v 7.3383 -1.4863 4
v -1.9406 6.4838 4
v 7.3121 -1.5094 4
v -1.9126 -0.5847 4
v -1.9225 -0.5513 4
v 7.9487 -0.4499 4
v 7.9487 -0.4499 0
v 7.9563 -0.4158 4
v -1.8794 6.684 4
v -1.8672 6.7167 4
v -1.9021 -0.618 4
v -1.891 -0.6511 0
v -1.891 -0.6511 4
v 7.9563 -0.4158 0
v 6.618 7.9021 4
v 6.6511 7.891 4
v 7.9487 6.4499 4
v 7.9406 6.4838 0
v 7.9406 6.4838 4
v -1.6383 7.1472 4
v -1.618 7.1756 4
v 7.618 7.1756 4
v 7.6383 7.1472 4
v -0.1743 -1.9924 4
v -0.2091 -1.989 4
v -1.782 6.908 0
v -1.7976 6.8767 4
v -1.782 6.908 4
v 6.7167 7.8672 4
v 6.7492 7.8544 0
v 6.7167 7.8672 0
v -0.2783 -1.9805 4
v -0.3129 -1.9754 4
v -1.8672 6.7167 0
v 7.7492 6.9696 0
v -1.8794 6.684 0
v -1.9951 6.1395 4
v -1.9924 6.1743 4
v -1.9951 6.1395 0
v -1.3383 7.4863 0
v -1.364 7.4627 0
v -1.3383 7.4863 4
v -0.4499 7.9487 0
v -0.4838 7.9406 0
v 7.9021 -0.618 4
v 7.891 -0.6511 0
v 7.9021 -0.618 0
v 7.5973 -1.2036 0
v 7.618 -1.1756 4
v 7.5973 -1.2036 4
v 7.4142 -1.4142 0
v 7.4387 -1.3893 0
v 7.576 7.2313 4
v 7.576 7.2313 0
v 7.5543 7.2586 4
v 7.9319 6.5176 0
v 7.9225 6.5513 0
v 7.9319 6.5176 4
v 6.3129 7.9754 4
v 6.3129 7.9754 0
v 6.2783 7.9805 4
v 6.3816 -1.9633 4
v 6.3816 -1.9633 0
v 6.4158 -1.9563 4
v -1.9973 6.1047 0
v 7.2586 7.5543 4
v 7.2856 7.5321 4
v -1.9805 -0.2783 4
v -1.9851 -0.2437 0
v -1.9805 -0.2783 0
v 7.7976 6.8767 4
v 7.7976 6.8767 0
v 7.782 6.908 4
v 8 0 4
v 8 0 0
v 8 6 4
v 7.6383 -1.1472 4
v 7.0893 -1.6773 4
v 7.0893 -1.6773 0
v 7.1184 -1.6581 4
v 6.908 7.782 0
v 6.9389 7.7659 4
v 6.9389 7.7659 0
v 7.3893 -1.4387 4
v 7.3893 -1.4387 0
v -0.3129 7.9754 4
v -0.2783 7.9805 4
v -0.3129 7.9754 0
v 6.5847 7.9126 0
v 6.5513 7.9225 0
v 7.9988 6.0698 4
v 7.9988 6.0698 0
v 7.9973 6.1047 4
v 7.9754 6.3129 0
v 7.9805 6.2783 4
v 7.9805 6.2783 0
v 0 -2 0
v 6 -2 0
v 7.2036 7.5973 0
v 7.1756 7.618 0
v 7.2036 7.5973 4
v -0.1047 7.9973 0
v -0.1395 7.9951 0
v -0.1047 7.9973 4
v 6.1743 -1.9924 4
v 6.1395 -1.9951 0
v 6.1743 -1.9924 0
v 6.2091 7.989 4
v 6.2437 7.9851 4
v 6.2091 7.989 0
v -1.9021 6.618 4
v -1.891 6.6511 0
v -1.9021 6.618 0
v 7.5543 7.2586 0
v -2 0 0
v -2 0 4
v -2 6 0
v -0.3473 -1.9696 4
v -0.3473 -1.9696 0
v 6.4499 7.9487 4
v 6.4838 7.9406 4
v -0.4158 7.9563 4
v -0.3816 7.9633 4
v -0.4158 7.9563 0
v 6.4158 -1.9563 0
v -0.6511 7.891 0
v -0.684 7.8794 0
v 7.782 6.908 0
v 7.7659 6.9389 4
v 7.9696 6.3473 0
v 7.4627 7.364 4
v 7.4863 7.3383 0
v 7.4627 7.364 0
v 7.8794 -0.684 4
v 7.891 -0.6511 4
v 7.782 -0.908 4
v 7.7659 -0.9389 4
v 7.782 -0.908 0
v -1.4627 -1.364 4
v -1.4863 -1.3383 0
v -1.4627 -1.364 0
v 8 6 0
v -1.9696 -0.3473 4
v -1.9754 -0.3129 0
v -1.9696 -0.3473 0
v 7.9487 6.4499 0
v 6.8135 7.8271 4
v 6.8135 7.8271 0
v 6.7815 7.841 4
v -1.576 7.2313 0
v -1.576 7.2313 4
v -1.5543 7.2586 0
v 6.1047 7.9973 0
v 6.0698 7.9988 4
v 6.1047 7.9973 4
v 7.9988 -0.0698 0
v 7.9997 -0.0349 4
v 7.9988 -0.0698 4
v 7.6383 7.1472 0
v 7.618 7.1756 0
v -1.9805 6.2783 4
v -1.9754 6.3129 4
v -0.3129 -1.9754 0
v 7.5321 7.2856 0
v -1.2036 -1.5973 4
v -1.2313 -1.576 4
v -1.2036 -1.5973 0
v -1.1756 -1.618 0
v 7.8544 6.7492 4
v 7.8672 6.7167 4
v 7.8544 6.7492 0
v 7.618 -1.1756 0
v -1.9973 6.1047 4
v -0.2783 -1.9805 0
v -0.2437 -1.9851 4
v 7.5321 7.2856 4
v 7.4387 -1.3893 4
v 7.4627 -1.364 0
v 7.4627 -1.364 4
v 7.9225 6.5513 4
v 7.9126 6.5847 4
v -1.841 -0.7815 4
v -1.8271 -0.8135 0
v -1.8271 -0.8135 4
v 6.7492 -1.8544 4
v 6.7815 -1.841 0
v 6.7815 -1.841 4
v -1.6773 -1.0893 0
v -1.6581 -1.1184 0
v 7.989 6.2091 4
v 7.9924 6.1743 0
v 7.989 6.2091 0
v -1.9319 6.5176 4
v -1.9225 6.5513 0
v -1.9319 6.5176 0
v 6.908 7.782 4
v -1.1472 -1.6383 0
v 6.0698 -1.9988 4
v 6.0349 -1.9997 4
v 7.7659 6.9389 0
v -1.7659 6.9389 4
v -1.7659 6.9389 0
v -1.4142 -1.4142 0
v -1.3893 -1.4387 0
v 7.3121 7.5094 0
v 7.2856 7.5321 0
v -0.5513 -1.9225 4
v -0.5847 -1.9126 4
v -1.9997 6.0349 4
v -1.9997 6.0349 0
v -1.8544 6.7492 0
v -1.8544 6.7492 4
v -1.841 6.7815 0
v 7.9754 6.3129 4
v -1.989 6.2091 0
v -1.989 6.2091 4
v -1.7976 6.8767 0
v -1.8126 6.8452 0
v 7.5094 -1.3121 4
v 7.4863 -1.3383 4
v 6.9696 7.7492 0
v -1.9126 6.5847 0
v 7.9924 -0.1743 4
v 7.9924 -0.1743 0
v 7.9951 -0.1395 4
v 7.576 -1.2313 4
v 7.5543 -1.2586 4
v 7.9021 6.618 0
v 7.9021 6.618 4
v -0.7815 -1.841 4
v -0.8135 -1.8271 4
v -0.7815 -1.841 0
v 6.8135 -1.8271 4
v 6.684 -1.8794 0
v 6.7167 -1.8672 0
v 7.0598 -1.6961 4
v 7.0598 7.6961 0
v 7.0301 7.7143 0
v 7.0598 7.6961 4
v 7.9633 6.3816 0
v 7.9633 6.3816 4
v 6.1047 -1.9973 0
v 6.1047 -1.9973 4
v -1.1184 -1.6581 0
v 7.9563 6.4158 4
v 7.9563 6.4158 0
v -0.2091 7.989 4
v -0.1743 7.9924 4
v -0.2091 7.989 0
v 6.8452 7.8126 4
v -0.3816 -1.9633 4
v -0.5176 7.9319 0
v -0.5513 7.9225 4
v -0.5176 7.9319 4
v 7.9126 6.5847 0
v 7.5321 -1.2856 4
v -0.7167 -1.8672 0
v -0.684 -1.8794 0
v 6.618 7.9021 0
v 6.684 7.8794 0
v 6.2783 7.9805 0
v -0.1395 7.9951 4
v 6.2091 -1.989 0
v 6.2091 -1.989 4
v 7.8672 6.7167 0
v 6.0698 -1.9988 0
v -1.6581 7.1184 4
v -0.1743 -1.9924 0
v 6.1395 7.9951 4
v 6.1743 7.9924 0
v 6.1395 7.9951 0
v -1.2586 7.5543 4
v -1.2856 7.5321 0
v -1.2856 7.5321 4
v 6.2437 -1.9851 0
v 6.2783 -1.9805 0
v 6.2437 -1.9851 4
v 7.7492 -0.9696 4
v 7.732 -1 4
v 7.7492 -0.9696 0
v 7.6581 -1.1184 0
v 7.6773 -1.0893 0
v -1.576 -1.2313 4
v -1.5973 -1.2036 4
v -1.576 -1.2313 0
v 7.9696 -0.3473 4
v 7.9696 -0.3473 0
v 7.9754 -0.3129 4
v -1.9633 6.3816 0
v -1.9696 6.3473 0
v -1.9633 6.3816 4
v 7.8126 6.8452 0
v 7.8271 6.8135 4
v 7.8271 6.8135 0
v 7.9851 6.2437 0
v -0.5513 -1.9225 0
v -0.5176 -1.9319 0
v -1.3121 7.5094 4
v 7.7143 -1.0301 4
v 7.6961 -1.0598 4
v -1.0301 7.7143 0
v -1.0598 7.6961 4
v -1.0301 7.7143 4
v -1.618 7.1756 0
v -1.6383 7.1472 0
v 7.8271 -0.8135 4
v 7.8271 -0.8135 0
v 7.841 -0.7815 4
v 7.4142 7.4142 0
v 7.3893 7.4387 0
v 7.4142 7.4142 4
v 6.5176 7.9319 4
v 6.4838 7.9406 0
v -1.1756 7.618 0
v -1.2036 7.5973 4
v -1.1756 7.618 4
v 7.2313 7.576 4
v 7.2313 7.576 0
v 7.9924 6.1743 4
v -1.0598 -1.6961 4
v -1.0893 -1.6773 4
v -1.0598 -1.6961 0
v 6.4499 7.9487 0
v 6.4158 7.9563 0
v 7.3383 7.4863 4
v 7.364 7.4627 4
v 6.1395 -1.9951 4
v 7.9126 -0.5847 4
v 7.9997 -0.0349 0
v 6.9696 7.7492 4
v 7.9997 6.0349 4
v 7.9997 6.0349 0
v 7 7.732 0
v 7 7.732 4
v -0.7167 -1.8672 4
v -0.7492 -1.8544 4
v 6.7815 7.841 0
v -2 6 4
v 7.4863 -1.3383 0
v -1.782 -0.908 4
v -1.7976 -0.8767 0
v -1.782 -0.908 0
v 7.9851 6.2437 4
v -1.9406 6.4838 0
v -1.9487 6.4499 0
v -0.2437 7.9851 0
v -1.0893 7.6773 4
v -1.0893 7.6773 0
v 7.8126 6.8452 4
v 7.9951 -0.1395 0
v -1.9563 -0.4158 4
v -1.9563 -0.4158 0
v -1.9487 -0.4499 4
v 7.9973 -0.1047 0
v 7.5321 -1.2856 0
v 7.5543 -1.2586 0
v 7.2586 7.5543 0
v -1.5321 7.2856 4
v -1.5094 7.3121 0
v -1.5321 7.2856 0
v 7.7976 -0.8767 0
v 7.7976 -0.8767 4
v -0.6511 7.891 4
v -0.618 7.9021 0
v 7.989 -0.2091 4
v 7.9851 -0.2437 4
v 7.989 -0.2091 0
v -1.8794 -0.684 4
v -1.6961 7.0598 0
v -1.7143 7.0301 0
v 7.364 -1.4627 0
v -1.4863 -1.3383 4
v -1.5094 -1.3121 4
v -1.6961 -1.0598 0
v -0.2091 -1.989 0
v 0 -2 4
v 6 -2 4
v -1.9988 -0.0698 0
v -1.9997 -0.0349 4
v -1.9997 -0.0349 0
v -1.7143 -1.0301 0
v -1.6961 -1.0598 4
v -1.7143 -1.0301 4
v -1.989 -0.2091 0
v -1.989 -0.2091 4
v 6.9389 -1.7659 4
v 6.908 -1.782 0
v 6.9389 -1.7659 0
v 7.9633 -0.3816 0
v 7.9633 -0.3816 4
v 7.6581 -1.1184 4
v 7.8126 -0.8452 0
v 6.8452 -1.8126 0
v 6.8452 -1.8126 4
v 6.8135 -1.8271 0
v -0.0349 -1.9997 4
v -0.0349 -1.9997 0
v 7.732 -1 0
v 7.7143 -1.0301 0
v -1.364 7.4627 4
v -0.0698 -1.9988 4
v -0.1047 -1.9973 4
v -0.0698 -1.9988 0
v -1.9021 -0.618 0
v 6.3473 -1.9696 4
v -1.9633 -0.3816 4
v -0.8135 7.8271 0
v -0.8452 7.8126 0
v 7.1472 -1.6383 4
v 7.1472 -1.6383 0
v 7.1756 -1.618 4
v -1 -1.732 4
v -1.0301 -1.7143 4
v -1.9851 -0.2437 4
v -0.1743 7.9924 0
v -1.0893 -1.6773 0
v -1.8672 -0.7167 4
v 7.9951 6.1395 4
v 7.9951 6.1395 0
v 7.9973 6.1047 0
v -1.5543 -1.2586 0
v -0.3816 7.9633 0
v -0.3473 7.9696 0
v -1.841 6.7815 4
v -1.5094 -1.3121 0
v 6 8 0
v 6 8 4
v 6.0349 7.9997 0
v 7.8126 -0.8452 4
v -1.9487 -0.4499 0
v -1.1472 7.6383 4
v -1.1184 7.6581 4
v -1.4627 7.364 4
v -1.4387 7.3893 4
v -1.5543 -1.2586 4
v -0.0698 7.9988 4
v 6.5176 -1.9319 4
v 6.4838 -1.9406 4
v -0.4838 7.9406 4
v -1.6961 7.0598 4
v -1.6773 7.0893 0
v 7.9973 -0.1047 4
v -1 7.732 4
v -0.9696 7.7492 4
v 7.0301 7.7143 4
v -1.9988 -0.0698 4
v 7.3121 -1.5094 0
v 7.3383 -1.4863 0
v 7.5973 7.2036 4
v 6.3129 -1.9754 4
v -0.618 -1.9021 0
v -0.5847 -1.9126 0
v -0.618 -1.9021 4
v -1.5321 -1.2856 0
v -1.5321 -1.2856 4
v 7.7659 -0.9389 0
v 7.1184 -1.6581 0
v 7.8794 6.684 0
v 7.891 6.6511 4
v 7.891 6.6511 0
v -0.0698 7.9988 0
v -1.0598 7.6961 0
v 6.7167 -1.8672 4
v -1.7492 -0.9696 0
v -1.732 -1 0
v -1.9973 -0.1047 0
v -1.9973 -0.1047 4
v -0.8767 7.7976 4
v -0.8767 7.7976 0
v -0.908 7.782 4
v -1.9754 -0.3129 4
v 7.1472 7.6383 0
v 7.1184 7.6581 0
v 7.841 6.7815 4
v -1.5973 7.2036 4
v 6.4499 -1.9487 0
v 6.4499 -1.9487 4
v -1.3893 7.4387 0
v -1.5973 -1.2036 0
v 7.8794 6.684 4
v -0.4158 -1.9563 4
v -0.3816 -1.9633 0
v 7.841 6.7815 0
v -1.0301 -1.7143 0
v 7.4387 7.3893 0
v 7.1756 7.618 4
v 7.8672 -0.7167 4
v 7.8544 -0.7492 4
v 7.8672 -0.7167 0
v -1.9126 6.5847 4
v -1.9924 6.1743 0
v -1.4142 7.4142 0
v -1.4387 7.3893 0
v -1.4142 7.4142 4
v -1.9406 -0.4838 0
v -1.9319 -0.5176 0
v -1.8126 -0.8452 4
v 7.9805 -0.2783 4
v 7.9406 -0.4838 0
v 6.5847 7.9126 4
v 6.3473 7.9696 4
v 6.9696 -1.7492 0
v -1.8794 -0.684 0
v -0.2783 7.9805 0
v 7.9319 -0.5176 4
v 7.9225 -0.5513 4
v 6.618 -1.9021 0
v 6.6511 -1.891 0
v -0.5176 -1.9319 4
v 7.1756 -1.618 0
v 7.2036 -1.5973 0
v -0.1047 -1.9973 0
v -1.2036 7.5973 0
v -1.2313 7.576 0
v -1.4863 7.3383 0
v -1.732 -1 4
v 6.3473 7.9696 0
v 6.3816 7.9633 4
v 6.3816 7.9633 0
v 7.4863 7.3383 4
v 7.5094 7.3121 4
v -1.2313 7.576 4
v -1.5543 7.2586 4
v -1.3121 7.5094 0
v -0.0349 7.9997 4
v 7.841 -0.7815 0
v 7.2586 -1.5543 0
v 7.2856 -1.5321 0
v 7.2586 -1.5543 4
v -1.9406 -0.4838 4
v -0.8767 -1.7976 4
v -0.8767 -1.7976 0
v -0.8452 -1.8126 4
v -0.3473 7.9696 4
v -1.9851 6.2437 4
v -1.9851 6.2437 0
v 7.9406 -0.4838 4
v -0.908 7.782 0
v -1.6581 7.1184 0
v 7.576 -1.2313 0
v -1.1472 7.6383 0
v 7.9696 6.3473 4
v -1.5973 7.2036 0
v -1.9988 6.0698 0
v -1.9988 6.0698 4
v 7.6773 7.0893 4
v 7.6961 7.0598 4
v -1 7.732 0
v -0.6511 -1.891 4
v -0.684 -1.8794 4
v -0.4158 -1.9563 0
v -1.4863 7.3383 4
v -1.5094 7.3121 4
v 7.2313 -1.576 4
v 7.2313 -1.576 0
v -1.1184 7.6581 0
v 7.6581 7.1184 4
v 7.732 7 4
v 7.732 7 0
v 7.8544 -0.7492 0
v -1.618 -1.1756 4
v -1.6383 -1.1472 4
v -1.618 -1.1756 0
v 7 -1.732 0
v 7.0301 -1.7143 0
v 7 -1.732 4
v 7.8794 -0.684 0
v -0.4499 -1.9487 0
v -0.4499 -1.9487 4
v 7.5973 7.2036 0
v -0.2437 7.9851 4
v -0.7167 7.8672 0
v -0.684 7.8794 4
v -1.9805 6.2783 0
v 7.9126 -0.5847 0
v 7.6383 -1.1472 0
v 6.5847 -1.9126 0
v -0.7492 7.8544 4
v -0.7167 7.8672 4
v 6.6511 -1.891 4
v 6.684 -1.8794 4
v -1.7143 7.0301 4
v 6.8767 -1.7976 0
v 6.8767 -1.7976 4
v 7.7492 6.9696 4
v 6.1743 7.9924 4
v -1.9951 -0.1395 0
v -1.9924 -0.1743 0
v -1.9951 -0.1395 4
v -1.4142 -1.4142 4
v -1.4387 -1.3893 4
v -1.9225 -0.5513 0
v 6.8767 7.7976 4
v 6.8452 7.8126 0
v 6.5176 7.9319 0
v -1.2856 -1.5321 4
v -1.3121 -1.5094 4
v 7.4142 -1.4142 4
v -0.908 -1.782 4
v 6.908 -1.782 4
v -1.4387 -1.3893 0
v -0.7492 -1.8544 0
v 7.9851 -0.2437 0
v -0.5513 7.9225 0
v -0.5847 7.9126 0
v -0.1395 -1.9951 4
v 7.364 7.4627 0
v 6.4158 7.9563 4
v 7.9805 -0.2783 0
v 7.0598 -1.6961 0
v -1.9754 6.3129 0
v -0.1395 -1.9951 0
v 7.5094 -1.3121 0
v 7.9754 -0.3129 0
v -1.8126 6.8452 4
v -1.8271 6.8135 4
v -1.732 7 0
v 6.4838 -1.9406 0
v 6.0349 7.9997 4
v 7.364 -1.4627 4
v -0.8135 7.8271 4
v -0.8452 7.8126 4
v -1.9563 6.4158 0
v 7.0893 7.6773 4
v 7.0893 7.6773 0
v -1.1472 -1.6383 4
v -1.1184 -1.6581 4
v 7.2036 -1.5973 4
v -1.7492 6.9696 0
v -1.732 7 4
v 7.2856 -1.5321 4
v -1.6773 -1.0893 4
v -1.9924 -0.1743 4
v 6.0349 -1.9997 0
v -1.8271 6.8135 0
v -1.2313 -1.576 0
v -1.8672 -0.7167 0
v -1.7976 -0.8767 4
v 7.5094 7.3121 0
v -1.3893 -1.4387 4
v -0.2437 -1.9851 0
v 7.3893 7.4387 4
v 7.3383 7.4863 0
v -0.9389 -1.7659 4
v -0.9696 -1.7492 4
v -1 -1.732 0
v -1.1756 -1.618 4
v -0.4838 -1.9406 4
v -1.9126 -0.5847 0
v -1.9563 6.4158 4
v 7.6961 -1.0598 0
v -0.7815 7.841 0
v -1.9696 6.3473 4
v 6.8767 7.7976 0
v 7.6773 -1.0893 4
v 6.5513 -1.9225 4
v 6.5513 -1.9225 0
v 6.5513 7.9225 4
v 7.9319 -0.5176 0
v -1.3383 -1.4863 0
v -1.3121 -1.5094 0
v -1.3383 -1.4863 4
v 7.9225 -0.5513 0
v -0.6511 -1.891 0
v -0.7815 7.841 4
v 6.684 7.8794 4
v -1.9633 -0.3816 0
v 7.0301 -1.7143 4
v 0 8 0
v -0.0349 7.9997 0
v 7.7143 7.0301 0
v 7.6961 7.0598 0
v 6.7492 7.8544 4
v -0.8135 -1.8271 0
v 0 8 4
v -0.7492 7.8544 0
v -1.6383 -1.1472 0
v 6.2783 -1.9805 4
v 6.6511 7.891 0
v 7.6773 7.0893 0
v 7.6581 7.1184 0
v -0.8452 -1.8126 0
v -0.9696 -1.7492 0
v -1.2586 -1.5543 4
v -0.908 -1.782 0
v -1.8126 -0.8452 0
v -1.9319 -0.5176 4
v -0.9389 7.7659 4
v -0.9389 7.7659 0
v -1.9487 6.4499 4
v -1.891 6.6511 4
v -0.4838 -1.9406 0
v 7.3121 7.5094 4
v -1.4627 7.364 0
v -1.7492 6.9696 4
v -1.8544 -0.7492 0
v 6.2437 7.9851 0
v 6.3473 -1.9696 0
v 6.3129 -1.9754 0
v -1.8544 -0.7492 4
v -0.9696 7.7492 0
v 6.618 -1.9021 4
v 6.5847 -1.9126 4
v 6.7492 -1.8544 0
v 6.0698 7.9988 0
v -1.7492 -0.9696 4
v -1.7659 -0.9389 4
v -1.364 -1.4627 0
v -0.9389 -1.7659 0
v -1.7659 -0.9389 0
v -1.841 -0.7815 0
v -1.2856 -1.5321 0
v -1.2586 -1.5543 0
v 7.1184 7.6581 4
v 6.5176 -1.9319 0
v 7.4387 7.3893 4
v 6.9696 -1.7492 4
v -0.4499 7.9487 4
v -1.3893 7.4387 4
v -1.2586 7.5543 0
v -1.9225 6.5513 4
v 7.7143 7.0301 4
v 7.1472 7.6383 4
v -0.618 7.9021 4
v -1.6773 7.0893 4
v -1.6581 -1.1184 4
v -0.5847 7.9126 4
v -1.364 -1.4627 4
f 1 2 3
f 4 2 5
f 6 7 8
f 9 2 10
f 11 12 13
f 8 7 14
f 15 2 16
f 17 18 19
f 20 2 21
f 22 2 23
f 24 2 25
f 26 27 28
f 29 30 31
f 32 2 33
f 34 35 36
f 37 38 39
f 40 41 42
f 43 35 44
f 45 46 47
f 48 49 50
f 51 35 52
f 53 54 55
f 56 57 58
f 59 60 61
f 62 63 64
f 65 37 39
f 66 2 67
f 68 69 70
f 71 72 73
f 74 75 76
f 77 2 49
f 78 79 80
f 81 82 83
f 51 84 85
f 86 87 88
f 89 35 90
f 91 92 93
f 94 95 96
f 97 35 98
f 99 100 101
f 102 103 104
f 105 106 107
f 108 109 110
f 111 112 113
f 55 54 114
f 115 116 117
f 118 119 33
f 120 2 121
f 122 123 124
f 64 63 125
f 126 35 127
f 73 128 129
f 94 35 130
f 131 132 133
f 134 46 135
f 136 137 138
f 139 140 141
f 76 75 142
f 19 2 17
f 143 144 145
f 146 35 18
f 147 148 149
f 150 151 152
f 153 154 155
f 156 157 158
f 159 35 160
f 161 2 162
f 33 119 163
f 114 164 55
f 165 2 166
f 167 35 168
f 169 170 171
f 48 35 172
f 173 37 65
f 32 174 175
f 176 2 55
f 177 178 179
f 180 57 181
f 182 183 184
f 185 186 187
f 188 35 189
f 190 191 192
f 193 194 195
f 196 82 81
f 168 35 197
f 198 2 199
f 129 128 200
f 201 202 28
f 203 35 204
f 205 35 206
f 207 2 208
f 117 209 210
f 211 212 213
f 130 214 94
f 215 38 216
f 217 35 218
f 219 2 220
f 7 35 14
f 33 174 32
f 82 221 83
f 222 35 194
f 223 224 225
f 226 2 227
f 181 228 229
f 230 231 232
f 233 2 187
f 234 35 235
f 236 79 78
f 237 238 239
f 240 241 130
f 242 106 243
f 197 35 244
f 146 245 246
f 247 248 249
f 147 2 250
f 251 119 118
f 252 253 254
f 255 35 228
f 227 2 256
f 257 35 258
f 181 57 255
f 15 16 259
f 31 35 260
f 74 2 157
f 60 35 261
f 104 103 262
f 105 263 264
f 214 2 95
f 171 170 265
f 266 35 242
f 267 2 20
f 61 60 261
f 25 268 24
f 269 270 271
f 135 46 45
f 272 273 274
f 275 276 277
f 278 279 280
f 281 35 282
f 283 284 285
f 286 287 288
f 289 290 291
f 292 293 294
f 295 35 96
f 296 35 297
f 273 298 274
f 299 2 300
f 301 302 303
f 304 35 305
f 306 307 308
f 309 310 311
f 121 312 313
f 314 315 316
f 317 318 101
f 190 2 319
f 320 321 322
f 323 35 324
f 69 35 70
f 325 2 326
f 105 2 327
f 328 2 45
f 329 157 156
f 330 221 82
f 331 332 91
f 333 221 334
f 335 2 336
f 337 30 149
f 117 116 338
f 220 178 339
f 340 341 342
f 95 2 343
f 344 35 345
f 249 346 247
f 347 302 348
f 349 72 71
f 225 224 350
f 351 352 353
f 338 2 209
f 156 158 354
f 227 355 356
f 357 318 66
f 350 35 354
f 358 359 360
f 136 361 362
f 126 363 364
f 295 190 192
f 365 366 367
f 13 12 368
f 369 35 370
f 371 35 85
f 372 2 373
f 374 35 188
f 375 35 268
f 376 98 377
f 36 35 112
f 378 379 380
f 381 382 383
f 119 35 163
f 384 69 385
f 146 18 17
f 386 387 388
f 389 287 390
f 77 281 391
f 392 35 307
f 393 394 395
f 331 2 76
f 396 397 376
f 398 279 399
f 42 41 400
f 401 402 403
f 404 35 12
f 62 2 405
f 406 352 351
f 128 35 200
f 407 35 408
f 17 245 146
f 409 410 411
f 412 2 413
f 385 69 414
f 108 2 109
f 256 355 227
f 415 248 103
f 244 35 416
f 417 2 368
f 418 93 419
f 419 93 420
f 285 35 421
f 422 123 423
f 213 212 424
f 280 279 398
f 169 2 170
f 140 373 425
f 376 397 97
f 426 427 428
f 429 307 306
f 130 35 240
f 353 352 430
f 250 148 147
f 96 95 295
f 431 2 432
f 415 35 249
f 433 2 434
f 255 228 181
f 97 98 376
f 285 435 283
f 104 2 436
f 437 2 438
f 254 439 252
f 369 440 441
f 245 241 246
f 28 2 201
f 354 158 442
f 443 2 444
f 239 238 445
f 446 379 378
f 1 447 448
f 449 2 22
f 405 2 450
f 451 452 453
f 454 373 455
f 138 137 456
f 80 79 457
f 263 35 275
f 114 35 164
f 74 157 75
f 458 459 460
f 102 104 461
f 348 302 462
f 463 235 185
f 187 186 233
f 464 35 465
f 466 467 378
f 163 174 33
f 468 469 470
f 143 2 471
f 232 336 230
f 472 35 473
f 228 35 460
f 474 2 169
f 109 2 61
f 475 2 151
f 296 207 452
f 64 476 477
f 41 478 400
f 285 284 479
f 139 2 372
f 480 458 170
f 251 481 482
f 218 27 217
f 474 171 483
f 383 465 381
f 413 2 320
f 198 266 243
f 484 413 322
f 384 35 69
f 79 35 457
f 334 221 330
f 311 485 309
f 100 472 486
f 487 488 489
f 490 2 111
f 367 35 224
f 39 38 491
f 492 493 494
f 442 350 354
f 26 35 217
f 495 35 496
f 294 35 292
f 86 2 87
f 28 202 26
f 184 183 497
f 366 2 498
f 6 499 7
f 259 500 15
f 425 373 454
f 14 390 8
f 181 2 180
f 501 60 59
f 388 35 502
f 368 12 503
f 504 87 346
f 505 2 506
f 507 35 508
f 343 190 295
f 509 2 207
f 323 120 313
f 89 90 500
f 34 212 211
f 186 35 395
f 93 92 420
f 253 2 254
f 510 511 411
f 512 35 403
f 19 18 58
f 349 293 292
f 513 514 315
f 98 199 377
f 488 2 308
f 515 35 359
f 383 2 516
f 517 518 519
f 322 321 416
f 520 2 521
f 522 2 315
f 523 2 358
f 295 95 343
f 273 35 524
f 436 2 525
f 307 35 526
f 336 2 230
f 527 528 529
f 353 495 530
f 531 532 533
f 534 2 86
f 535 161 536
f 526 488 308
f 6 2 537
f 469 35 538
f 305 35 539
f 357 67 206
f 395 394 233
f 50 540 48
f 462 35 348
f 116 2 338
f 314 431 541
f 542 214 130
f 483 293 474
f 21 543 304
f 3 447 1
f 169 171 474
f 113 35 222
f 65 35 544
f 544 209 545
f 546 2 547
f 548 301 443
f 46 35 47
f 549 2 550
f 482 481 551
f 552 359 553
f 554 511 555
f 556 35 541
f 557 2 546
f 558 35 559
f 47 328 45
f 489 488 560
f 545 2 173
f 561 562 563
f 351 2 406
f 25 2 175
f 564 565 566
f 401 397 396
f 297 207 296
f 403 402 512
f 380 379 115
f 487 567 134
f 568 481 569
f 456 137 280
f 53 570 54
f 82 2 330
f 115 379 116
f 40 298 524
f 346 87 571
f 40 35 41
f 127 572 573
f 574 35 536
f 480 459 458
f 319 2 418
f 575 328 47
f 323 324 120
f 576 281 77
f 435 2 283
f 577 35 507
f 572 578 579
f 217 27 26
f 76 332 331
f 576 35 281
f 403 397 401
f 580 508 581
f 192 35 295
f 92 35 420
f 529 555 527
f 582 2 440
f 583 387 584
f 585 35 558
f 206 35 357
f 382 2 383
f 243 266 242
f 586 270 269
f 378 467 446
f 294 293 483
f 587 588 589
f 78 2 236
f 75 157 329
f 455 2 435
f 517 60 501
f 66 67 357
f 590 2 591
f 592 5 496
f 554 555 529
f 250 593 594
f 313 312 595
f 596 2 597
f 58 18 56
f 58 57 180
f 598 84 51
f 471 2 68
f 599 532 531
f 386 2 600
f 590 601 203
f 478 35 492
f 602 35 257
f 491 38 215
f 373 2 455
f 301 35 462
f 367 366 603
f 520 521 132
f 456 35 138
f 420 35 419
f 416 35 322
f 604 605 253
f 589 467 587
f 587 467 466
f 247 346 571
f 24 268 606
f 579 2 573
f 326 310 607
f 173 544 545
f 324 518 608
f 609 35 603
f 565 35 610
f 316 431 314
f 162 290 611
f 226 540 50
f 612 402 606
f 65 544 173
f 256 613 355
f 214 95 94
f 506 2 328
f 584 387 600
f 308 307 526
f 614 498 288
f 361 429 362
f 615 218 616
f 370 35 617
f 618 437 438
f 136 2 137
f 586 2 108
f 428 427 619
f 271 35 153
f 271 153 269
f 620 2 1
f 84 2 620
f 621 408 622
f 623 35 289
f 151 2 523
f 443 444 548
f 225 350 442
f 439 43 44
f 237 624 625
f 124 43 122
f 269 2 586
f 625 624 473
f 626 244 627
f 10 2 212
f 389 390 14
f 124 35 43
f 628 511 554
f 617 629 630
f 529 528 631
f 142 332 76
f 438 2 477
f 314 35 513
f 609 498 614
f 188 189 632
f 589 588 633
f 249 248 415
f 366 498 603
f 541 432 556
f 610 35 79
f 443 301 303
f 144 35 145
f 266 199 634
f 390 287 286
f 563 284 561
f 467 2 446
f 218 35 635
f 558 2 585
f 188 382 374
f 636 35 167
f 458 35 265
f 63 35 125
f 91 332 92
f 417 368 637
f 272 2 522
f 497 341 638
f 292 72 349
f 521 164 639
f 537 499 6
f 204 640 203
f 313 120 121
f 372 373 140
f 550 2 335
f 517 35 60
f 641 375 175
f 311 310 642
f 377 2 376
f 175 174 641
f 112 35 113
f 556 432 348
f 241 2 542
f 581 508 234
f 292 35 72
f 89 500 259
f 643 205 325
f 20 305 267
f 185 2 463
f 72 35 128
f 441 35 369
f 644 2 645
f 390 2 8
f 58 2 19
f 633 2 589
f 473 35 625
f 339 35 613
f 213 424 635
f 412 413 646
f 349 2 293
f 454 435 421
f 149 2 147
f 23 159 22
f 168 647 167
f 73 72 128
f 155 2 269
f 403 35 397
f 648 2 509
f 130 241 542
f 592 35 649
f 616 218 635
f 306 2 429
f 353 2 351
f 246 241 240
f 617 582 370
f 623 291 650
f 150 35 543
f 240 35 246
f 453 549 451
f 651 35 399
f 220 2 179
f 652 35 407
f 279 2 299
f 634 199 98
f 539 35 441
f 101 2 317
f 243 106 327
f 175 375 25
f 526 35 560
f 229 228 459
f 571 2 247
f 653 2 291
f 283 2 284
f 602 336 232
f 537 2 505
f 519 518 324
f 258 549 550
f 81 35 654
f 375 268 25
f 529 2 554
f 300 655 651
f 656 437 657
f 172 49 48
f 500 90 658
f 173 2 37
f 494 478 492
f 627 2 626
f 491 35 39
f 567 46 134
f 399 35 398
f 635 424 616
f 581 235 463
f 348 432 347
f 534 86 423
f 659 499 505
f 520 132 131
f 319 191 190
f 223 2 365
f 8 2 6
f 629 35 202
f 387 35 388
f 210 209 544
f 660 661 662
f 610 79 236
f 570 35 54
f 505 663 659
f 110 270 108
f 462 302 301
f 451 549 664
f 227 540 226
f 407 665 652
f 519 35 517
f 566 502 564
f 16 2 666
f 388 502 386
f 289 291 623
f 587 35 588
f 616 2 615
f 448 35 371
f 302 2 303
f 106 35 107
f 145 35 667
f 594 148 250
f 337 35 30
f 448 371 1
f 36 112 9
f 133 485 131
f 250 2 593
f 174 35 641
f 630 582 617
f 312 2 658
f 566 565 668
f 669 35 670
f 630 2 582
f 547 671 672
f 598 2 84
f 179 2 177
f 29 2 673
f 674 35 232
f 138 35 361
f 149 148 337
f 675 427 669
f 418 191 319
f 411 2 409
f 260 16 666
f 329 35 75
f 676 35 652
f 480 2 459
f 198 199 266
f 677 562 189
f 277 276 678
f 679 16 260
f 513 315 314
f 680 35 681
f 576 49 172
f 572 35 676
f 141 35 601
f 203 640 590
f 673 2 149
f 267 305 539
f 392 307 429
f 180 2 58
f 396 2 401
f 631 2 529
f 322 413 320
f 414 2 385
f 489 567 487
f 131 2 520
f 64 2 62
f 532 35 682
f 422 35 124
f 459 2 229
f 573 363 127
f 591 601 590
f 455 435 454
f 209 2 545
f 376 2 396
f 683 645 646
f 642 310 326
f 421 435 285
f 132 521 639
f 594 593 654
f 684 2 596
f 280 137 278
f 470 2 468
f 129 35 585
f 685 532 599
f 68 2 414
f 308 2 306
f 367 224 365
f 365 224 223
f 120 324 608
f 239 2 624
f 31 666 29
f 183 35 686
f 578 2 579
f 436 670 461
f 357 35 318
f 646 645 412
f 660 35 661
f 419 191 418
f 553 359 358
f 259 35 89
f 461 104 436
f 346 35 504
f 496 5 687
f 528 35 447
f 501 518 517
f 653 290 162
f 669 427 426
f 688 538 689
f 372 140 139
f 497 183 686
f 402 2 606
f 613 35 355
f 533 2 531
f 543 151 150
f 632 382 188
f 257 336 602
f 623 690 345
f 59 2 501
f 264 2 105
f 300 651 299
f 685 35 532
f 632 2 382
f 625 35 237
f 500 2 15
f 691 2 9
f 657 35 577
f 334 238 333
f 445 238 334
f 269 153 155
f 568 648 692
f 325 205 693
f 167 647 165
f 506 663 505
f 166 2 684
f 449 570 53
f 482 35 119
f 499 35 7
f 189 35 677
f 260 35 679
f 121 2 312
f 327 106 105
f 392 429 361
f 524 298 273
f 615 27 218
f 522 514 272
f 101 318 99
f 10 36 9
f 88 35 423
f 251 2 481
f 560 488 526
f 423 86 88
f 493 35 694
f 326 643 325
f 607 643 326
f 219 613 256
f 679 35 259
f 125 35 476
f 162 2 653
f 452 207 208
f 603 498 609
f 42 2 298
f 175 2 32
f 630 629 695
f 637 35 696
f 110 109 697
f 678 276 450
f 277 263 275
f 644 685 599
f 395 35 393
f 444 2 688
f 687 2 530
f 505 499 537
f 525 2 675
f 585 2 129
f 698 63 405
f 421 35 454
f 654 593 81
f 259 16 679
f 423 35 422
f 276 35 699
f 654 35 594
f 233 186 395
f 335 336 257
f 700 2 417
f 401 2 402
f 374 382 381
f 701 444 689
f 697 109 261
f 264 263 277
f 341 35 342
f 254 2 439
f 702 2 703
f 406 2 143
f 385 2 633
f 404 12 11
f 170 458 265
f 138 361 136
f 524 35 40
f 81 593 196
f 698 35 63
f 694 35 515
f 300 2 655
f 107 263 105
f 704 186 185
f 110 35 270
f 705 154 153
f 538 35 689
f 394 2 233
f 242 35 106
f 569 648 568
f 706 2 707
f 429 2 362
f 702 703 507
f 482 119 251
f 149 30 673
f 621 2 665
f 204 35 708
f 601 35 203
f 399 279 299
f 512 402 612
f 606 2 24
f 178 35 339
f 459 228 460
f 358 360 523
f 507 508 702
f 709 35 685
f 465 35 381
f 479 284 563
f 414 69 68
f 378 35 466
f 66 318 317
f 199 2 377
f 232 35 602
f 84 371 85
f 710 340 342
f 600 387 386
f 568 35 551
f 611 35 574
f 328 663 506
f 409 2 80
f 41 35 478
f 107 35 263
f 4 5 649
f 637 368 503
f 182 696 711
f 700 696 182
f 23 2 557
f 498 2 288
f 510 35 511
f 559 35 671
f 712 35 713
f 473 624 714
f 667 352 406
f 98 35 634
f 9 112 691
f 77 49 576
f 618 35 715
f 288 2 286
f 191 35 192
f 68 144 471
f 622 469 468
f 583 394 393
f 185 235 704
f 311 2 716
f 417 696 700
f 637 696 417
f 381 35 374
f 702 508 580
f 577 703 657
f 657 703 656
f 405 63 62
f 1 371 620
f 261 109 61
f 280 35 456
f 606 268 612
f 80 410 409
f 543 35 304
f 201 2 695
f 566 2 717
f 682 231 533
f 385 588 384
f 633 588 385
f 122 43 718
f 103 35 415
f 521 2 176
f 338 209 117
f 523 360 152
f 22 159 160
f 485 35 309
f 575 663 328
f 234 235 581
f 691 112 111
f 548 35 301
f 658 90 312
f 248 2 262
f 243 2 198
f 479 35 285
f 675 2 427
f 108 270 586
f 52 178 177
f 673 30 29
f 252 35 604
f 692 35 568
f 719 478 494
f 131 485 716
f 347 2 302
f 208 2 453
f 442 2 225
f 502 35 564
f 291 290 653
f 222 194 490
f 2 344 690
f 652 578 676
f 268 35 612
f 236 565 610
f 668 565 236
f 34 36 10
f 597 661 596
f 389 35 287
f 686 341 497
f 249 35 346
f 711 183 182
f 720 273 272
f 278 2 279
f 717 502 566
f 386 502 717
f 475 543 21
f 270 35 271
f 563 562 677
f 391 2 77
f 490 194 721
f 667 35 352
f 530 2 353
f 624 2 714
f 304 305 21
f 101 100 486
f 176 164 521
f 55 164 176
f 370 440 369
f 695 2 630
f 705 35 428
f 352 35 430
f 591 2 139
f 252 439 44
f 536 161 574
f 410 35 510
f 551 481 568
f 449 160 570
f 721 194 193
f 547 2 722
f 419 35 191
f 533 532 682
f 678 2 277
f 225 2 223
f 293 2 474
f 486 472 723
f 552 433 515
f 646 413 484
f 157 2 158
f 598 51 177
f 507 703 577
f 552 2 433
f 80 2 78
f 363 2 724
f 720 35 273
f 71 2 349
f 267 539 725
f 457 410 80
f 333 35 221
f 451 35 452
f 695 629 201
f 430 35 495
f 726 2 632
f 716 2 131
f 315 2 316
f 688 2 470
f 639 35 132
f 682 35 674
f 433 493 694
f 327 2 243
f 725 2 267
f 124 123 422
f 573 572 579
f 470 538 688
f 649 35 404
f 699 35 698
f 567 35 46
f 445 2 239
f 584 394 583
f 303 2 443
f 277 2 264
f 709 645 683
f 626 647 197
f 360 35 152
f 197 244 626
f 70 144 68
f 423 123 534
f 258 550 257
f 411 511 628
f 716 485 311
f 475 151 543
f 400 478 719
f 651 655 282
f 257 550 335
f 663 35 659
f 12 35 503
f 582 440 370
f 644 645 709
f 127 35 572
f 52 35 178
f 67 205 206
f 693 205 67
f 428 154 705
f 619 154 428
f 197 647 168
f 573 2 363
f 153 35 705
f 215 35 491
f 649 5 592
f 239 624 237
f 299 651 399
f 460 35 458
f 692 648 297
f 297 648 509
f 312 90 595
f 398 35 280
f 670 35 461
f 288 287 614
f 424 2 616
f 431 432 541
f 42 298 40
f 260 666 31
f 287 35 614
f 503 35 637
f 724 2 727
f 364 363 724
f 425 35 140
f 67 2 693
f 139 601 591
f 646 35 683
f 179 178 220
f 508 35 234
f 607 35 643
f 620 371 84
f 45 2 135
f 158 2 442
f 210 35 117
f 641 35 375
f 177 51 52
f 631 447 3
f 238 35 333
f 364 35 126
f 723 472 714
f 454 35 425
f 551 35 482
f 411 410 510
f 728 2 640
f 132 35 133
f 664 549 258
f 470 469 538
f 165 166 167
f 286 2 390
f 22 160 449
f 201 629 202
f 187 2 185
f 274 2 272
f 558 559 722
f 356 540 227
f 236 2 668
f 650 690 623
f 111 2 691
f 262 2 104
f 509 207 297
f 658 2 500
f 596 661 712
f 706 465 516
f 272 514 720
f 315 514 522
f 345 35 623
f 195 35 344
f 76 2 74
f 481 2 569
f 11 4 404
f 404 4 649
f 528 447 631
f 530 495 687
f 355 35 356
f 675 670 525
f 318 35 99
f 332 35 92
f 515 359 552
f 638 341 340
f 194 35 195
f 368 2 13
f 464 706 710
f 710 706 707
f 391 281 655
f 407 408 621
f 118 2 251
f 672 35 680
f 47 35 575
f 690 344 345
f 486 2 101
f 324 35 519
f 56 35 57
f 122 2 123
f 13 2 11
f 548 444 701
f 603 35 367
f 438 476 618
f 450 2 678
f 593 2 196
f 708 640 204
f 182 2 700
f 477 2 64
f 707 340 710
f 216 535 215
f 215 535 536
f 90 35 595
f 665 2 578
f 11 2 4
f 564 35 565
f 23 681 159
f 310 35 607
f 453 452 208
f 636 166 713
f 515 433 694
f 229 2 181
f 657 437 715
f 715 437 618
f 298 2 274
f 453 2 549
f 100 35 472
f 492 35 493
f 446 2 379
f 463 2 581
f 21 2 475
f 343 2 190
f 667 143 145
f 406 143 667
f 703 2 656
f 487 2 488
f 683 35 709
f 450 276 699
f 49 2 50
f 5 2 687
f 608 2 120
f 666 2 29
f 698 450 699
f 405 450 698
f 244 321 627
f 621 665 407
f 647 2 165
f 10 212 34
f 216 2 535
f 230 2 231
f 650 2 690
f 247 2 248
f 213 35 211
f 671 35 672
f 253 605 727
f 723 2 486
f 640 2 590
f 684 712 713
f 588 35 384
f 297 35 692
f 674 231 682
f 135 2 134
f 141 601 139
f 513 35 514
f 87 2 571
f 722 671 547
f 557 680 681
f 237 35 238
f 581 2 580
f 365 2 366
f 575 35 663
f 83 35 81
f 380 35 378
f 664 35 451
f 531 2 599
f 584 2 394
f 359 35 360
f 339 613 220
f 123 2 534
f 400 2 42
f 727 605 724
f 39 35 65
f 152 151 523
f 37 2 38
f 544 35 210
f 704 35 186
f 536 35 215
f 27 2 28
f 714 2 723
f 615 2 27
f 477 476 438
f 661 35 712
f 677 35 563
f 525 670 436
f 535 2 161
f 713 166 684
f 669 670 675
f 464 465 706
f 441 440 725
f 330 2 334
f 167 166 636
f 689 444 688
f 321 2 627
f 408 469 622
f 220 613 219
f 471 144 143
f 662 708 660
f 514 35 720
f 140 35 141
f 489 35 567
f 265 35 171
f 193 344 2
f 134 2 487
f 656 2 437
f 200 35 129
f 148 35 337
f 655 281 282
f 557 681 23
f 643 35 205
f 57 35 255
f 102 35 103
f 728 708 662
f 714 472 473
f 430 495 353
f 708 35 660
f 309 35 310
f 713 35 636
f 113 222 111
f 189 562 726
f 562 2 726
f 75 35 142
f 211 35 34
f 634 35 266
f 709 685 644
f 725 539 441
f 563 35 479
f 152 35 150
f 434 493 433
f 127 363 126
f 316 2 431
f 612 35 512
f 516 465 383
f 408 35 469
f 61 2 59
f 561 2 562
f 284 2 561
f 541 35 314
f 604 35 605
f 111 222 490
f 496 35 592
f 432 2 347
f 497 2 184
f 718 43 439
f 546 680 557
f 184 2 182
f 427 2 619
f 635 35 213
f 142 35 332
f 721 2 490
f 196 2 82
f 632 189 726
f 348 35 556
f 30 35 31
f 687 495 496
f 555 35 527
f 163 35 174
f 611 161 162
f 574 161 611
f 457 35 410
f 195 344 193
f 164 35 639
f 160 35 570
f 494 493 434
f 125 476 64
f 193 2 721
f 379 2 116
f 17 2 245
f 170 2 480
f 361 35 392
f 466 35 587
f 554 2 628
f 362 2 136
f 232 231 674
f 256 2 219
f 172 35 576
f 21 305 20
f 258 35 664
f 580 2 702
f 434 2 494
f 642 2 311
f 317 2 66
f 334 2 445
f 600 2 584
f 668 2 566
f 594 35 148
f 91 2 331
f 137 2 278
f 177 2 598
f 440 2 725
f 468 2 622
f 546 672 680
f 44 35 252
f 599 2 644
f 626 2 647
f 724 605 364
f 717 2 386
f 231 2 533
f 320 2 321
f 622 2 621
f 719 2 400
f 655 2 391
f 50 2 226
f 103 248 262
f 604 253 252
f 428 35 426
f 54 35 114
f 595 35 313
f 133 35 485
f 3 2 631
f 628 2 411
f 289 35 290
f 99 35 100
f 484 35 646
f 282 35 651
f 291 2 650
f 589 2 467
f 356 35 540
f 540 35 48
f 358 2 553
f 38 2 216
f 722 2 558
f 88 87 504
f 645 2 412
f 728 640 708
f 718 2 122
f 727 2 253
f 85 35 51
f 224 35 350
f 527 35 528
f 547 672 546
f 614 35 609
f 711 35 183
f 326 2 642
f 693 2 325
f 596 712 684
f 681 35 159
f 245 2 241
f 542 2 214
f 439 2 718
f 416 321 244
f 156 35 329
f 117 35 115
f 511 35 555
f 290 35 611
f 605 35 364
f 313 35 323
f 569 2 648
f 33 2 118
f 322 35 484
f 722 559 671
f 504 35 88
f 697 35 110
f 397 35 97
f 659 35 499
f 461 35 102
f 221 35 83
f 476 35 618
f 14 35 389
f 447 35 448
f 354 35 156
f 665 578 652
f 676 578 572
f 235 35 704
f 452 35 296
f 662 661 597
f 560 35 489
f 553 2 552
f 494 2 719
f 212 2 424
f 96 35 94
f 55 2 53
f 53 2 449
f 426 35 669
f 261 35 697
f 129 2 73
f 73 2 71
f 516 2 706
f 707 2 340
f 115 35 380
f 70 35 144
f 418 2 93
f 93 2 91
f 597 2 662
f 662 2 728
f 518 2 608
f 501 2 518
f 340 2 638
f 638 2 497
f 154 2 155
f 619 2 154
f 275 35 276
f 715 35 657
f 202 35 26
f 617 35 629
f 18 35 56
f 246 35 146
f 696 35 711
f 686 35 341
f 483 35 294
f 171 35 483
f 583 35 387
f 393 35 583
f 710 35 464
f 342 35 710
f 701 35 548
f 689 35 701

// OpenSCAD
Width = 10;
Depth = 10;
Height = 2;
Radius = 2;

$fn=360;
minkowski()
{
cube([Width-2*Radius,Depth-2*Radius,Height]);
cylinder(Height,Radius,Radius);
}
